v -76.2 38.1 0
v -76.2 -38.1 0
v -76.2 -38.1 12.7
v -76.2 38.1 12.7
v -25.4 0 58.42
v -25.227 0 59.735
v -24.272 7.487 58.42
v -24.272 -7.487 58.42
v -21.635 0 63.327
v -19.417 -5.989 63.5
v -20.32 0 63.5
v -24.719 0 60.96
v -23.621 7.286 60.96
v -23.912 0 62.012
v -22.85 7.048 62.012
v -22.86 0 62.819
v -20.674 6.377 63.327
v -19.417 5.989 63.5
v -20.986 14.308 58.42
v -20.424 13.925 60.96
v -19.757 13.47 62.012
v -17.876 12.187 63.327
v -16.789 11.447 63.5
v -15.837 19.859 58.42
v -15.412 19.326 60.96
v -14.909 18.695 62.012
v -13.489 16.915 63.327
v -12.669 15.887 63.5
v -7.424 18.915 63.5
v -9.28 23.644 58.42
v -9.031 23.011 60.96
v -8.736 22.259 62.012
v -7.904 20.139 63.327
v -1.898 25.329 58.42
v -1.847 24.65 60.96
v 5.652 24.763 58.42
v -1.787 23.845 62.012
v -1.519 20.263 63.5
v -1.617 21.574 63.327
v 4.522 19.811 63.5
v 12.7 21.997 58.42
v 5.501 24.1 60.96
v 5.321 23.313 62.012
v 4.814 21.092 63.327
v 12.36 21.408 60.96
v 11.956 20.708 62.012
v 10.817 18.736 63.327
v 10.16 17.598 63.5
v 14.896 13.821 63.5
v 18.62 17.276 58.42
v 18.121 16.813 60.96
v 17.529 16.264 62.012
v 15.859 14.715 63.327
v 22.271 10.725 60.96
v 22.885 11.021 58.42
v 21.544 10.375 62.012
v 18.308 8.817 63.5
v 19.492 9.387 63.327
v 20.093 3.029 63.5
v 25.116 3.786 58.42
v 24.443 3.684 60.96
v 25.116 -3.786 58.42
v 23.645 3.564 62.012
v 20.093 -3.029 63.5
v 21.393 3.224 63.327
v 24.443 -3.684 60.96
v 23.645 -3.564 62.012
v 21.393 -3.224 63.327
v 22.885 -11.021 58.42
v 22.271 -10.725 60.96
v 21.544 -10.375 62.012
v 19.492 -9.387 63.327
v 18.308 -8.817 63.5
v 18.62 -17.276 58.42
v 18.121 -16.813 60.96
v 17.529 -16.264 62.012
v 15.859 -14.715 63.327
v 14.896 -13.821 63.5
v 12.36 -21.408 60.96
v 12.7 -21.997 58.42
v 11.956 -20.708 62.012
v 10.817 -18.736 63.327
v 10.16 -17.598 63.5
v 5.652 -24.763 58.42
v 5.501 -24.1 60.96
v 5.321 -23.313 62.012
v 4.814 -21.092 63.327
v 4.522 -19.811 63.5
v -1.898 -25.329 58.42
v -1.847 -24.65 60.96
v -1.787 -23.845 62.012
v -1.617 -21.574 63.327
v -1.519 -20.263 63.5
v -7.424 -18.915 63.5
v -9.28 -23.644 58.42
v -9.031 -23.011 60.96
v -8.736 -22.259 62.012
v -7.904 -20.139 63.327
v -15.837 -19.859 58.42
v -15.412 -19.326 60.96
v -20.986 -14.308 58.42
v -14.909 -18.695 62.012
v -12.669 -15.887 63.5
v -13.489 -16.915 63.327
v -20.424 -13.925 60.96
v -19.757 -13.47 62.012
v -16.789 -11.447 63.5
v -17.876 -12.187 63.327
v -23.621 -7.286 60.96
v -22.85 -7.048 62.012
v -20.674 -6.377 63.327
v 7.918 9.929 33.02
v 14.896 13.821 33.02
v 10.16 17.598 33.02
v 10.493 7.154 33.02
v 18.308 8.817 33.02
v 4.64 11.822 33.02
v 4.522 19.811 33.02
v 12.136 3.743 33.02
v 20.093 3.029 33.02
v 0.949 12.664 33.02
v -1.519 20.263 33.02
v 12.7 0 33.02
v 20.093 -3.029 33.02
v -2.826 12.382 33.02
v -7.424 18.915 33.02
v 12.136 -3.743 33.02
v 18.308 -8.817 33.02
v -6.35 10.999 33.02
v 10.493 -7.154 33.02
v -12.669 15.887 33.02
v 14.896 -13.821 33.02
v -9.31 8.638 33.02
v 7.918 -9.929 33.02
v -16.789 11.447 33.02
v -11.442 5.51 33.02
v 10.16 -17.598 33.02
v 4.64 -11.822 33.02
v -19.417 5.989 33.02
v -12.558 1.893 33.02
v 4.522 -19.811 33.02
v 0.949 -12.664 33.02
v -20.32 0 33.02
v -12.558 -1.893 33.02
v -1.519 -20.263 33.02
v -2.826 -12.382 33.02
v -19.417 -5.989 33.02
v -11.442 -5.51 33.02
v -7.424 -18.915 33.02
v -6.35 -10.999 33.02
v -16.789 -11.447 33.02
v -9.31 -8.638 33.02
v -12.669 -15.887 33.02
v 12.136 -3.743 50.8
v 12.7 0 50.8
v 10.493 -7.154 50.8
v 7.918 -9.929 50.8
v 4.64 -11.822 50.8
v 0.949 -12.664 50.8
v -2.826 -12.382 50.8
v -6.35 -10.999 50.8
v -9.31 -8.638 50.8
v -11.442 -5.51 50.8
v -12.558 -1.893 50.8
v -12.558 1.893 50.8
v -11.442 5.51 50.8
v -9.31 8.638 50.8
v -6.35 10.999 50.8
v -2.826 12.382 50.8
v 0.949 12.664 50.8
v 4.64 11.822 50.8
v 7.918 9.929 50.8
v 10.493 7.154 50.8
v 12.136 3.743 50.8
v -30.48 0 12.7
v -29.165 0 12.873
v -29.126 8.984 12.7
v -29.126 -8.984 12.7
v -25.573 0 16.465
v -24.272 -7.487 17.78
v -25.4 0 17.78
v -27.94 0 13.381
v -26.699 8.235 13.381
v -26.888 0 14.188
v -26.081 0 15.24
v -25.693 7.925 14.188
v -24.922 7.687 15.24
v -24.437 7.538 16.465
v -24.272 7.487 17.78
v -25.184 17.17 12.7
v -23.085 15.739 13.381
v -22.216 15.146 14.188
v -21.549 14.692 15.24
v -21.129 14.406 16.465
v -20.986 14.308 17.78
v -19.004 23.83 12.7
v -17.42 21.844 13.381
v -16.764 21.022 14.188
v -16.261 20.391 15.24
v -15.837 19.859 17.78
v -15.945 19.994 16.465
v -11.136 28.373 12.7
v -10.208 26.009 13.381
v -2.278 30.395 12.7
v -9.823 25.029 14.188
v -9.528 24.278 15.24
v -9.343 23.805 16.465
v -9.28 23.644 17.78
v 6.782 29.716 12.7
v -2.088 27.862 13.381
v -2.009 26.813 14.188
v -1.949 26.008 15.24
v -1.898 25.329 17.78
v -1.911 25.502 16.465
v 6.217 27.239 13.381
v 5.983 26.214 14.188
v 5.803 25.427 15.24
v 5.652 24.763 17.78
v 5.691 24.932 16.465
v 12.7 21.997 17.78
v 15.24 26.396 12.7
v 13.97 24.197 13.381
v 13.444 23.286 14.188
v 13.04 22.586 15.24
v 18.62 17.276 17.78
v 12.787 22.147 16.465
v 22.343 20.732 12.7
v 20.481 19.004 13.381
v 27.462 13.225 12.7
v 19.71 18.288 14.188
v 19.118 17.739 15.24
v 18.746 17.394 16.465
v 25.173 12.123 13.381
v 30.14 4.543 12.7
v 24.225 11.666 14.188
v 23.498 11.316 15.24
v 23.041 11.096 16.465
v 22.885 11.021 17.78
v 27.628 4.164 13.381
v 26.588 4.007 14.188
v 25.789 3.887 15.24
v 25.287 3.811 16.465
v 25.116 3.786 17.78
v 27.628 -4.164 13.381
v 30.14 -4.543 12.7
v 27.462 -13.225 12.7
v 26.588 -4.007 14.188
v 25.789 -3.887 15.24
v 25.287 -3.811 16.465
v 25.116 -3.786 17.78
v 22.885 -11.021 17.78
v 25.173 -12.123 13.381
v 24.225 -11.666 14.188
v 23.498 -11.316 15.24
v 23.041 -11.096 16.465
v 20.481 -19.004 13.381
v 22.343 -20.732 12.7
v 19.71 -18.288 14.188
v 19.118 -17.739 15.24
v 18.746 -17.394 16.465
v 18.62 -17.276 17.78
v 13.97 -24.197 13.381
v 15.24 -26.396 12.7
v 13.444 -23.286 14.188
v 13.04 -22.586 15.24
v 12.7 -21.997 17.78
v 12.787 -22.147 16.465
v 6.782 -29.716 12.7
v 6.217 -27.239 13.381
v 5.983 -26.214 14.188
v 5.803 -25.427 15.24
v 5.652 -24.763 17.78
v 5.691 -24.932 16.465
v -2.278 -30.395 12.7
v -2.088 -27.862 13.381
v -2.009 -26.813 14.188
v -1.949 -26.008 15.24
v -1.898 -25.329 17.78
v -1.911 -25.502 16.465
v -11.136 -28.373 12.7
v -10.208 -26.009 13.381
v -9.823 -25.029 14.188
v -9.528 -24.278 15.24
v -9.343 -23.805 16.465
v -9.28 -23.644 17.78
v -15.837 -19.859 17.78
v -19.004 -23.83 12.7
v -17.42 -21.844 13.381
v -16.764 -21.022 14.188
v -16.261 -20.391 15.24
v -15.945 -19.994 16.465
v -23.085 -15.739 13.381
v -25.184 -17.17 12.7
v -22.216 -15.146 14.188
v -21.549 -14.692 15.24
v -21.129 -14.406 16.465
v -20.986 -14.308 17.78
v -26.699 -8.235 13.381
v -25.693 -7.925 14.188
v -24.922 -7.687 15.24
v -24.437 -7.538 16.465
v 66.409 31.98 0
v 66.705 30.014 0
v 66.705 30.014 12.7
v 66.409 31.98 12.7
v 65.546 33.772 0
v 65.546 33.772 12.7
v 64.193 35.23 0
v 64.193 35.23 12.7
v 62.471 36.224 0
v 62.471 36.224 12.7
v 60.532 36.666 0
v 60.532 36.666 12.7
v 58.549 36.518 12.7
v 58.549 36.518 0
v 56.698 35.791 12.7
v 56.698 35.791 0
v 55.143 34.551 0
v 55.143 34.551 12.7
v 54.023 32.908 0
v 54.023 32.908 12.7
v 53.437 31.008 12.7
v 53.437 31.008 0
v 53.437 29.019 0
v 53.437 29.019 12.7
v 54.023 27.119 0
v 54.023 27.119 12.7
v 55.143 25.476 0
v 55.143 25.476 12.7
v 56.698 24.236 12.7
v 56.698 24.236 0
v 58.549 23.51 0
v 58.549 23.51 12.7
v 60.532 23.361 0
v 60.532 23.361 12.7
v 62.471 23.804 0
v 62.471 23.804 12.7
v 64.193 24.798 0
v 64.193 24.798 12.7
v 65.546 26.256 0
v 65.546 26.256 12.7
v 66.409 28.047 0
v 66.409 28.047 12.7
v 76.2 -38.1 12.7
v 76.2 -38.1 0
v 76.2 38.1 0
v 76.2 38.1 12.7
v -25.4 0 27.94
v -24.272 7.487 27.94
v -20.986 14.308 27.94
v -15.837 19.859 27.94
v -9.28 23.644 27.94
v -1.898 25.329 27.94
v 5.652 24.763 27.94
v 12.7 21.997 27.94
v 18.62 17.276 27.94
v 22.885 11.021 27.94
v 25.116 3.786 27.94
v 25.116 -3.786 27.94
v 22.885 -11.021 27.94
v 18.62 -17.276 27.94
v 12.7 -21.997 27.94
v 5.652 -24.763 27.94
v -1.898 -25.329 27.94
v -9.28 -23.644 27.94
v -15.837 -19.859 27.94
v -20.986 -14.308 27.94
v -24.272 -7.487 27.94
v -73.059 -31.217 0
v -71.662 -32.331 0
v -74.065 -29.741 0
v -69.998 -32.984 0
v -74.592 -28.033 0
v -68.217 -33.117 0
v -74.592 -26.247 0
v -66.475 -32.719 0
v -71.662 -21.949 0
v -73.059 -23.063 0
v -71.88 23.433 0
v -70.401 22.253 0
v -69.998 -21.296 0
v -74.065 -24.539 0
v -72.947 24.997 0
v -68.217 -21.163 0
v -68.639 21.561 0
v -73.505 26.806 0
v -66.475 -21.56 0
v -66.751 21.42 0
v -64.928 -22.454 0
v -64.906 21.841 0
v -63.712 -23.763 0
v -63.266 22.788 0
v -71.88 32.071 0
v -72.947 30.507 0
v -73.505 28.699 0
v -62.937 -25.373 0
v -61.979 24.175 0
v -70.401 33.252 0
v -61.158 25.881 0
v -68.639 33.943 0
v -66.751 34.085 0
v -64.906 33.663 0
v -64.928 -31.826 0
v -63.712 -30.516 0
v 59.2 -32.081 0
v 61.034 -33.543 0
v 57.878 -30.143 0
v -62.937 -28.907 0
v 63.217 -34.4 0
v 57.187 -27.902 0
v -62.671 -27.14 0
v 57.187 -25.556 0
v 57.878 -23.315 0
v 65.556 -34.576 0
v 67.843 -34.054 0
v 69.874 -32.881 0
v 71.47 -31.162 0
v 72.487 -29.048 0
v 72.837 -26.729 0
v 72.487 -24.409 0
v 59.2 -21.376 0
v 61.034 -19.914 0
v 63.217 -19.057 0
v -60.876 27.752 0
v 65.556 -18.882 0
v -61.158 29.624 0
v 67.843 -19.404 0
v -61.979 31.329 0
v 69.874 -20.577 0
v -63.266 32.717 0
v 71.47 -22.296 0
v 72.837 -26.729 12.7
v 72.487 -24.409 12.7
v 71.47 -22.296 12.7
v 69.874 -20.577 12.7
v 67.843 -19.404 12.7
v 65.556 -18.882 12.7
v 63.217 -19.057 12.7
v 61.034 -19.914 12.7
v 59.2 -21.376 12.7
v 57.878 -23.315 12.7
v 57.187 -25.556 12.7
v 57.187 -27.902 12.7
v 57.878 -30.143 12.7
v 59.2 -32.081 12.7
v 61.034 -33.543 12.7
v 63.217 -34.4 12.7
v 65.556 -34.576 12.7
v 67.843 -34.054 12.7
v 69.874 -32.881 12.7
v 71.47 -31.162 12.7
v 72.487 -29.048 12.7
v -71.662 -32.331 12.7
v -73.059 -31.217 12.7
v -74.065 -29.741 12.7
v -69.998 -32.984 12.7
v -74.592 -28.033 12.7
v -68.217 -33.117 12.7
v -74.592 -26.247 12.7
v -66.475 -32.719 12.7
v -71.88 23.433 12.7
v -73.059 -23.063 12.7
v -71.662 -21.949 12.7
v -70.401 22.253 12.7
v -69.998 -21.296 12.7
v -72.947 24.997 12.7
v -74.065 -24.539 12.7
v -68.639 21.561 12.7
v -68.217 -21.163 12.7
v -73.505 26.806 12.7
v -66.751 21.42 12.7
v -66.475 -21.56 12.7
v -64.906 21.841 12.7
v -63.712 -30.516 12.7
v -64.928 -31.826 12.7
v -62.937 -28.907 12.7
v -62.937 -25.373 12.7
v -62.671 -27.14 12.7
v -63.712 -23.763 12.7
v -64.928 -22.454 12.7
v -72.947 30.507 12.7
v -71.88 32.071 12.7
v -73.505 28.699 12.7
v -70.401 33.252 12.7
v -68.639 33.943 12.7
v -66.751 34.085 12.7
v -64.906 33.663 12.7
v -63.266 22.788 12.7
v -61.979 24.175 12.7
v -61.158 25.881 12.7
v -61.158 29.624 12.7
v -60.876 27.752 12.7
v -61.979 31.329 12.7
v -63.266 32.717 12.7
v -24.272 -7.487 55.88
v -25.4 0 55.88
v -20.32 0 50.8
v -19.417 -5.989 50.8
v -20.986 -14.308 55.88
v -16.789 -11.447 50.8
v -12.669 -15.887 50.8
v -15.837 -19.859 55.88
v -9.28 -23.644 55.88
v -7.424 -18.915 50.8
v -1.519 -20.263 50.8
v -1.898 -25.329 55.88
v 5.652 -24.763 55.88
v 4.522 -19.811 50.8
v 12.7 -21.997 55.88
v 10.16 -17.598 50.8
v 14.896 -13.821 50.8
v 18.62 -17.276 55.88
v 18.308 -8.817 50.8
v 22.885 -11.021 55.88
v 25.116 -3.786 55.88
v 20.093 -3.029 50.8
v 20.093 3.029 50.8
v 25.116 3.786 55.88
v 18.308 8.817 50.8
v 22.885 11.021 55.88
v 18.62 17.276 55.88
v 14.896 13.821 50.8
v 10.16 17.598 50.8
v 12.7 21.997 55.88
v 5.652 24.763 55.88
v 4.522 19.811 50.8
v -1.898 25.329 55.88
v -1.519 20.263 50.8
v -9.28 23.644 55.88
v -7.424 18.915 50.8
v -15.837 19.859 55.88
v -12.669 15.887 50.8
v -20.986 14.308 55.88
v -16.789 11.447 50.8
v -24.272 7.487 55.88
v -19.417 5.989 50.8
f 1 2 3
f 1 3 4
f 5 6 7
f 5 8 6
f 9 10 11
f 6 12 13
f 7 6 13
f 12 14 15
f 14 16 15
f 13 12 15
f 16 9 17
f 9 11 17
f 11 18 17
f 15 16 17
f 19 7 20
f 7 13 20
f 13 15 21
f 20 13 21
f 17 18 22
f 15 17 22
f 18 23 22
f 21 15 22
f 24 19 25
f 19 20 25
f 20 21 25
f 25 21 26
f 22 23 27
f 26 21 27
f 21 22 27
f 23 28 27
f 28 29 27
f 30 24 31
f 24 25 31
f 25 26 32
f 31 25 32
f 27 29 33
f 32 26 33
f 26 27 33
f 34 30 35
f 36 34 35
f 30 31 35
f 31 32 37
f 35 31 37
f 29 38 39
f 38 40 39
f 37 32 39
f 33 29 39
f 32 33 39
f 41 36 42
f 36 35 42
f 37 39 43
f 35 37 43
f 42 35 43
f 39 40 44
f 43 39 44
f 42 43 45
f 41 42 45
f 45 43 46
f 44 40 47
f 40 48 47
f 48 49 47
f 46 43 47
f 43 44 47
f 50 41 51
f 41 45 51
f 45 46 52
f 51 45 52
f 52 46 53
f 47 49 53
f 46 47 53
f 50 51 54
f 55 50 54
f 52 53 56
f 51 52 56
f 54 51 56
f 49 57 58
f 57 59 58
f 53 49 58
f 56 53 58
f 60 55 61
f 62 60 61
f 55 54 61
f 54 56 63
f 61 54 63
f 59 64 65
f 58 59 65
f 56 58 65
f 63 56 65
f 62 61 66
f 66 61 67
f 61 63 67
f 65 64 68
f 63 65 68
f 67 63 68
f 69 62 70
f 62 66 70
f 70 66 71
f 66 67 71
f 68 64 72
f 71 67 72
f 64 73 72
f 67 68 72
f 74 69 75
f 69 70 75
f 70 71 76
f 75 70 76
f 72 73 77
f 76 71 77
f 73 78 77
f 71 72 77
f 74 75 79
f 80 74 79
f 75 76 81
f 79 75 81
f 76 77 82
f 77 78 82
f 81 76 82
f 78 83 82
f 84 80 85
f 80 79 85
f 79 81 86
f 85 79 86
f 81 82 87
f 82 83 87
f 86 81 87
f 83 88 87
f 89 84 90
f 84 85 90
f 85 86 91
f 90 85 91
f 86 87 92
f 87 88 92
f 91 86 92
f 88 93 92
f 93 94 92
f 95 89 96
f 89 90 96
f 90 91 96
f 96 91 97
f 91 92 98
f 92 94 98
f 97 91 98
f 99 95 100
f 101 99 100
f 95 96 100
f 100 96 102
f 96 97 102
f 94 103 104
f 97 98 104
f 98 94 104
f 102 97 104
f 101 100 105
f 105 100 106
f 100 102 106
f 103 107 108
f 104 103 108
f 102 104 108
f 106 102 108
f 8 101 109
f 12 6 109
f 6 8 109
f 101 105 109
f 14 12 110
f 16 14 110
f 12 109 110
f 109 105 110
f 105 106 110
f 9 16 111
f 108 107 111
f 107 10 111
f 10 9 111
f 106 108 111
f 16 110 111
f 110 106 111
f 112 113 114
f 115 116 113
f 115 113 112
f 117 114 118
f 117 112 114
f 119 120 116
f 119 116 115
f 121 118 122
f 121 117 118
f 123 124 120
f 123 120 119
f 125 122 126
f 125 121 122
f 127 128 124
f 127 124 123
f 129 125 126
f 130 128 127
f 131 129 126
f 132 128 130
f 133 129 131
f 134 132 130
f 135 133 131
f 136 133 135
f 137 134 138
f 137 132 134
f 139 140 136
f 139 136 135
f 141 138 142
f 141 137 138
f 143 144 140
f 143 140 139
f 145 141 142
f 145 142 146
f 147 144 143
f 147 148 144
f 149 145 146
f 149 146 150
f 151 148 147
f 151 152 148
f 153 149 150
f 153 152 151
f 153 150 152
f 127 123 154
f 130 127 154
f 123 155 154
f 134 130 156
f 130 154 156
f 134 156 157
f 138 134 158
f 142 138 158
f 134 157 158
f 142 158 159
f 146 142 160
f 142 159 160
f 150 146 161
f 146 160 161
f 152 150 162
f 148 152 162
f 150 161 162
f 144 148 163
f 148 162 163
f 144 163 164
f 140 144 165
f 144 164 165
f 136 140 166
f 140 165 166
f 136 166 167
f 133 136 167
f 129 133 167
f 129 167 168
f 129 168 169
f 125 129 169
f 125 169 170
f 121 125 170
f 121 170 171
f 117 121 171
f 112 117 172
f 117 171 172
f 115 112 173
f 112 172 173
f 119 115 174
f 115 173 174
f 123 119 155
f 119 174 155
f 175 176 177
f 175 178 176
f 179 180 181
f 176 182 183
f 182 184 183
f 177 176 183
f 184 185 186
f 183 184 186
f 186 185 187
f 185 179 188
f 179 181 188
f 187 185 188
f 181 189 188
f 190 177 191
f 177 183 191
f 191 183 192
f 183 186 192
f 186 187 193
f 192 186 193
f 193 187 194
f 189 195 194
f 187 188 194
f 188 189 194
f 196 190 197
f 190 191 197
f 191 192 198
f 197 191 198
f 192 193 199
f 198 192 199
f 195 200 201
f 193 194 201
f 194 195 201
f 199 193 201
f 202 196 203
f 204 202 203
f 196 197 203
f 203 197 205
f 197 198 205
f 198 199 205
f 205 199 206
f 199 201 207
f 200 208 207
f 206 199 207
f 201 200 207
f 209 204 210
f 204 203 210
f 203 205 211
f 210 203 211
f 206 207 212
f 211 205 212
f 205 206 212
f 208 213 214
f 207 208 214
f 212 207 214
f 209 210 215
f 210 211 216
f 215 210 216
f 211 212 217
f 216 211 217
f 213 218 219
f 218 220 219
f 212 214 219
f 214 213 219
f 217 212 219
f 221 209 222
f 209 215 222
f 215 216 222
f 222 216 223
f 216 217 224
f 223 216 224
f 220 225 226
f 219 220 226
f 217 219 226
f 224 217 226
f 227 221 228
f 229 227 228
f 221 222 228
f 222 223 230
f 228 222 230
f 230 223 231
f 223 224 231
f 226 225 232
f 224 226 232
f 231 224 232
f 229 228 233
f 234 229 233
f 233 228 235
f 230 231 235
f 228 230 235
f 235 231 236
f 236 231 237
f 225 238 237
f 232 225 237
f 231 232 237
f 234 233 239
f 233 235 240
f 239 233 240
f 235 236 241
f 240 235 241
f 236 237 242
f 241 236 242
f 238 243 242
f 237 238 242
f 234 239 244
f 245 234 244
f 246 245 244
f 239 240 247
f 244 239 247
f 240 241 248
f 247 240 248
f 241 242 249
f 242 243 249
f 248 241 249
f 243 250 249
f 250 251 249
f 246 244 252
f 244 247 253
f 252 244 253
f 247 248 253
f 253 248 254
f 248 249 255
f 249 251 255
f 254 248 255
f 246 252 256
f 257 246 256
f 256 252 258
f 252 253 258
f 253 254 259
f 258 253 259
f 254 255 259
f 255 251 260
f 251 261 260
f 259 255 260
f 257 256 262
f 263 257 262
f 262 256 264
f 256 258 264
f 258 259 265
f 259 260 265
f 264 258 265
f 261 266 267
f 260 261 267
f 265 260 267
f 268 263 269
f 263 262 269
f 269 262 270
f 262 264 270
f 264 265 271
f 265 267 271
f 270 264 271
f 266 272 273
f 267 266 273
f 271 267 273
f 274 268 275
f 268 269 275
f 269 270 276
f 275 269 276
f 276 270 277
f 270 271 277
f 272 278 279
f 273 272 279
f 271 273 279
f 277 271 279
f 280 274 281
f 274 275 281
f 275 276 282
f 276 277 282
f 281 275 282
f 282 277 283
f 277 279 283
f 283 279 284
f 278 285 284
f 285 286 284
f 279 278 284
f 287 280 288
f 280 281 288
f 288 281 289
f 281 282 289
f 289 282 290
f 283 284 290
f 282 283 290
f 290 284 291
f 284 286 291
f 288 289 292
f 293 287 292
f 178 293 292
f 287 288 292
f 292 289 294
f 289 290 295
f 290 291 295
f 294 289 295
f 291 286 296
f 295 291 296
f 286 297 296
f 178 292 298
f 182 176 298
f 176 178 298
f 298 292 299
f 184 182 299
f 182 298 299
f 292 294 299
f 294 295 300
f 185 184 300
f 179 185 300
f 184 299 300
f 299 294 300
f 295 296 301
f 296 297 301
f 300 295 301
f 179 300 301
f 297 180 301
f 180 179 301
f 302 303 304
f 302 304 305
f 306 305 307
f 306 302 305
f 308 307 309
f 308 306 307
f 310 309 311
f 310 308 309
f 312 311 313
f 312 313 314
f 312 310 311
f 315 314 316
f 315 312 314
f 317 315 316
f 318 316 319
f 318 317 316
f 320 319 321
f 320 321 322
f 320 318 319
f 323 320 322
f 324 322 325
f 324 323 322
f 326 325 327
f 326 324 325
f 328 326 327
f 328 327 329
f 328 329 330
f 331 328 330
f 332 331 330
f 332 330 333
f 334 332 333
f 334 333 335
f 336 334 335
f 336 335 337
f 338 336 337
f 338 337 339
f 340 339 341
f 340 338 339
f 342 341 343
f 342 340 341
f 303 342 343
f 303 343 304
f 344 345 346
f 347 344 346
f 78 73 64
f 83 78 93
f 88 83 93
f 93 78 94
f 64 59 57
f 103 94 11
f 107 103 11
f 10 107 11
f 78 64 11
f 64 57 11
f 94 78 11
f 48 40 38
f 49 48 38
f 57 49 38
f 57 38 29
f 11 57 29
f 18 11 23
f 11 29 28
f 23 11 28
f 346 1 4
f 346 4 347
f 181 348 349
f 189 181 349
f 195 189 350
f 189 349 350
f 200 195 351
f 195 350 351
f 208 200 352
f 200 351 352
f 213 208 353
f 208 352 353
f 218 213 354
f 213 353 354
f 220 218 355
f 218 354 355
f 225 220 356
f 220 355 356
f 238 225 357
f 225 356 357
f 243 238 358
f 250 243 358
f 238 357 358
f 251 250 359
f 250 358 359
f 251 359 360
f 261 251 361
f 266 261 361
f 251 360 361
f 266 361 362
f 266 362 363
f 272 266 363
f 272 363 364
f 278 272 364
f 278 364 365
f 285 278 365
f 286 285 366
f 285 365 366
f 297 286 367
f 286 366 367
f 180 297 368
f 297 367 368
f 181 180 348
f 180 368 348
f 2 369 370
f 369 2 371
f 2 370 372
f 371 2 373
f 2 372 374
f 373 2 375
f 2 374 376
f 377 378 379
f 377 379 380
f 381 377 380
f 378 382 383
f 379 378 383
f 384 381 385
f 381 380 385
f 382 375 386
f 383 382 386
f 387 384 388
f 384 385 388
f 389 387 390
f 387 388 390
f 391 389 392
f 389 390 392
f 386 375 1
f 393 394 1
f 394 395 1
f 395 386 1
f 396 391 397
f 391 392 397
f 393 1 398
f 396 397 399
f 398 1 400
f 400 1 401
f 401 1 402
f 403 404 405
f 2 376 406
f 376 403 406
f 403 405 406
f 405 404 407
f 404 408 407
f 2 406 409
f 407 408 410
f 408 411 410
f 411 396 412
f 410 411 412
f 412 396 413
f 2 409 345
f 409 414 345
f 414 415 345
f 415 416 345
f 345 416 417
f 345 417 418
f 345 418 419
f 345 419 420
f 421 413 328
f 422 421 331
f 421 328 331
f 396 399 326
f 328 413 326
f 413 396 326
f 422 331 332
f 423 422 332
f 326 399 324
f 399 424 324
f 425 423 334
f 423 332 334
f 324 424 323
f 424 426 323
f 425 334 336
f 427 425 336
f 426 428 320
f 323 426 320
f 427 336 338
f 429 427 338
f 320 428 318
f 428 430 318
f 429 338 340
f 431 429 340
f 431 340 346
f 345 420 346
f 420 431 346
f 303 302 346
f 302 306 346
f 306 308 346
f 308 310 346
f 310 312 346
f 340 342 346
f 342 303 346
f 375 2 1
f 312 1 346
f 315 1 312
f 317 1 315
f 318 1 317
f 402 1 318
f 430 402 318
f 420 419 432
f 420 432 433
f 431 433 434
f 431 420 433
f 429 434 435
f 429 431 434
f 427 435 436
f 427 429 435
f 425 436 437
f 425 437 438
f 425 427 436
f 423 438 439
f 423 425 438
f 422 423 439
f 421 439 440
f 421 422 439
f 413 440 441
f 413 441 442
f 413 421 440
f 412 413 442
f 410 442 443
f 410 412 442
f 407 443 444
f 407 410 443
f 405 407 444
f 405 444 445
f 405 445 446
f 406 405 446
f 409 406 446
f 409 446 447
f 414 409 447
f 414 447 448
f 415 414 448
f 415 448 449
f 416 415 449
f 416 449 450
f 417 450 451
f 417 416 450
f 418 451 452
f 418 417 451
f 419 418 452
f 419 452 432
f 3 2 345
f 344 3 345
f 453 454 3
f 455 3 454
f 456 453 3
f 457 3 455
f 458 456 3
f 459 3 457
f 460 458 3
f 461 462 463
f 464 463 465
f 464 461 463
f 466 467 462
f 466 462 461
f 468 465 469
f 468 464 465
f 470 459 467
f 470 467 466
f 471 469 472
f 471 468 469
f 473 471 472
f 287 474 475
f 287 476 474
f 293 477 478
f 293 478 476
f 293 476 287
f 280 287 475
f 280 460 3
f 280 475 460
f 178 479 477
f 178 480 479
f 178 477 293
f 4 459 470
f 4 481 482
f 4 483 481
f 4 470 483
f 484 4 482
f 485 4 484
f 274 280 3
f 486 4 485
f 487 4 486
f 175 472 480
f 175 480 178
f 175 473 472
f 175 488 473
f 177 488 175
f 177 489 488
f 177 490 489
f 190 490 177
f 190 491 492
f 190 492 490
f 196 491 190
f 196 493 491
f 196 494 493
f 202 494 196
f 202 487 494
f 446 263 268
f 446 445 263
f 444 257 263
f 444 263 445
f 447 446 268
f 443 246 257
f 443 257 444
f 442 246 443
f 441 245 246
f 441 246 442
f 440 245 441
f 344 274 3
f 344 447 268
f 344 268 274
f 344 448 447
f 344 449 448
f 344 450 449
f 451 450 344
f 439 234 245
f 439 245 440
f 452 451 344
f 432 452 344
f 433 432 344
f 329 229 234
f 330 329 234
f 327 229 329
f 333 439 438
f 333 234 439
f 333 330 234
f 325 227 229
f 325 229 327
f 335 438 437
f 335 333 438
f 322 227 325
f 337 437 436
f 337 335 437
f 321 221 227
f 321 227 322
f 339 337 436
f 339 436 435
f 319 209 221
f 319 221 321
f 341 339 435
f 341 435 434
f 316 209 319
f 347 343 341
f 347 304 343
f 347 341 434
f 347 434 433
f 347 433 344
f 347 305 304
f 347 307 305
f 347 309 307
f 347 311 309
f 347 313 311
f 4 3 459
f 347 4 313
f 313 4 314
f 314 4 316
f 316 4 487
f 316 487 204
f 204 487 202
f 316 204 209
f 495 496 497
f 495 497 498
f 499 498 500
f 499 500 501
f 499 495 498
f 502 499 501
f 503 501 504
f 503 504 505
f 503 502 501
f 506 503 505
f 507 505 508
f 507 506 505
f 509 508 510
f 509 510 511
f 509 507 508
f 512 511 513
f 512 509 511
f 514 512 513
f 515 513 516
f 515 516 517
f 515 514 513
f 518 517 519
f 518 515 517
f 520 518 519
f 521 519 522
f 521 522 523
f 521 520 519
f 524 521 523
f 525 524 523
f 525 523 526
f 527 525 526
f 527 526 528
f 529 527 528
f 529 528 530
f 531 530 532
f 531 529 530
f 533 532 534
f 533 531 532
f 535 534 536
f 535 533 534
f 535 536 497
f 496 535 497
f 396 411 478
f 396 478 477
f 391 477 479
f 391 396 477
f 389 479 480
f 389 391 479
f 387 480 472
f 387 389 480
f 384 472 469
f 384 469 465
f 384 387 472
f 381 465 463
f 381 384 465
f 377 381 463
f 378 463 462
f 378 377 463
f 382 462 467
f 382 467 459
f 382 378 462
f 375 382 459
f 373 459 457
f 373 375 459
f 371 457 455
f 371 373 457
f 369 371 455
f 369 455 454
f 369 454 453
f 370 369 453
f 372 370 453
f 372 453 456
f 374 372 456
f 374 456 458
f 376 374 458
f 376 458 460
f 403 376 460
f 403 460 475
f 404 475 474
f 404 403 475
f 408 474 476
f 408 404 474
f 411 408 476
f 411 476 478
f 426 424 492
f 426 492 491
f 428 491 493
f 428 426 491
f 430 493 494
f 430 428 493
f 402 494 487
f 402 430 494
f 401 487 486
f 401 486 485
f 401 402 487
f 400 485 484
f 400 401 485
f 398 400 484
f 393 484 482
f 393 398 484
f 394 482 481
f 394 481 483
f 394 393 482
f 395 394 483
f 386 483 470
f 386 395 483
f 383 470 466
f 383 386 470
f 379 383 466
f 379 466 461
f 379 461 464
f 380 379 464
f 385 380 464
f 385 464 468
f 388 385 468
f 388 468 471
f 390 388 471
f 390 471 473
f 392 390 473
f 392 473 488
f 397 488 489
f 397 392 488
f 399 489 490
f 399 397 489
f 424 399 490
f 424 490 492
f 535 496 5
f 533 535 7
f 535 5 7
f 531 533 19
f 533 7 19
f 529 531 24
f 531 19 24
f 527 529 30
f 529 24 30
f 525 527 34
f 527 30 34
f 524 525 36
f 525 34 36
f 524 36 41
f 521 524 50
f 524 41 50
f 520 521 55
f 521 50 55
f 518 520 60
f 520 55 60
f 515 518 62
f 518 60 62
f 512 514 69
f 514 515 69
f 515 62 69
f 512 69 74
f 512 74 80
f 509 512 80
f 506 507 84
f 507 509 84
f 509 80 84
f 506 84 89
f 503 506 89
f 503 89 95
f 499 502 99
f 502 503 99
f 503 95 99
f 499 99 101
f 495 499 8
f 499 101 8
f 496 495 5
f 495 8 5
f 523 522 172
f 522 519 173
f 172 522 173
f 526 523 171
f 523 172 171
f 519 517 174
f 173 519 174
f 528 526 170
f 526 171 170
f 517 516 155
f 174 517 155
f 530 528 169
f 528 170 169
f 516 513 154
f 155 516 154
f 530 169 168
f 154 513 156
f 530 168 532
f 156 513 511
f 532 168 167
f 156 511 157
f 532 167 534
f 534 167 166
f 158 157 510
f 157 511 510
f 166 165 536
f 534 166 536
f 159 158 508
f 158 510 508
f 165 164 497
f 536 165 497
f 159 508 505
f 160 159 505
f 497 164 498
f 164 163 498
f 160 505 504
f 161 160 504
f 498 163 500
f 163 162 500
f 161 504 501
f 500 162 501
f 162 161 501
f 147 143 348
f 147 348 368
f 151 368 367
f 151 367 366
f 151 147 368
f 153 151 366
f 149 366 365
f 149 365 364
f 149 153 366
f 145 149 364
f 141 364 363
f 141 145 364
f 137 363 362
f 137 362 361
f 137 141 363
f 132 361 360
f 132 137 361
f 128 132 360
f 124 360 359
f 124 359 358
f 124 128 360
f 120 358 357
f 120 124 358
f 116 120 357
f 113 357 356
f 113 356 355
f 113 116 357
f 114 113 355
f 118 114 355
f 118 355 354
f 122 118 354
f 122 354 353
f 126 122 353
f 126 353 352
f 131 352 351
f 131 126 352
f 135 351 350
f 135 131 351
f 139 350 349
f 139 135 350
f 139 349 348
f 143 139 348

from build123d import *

# Parameters (mm, degrees)
F0_W     = 152.4
F0_H     = 76.2
F1_DEPTH = 12.7
F2_R     = 6.35
F2_R_2   = 5.9938939969
F2_R_3   = 6.6713502792
F2_R_4   = 7.8689754044
F3_DEPTH = 12.7
F4_W     = 25.4
F4_H     = 50.8
F6_W     = 17.78
F6_H     = 17.78
F8_R     = 5.08
F9_SIZE  = 5.08


with BuildPart() as f1:
    # F0 (on Top) → F1 (new body)
    with BuildSketch(Plane.XY):
        Rectangle(F0_W, F0_H)
    extrude(amount=F1_DEPTH)

    # F2 (on Top) → F3 (cut)
    with BuildSketch(Plane.XY):
        with Locations((-67.2256079361, 27.7522747686)):
            Circle(F2_R)
        with Locations((-68.6647296343, -27.1399345782)):
            Circle(F2_R_2)
        with Locations((60.0338615502, 30.0137525229)):
            Circle(F2_R_3)
        with Locations((64.9679941536, -26.7287574834)):
            Circle(F2_R_4)
    extrude(amount=F3_DEPTH, mode=Mode.SUBTRACT)

    # F4 (on Front) → F5 (revolve)
    with BuildSketch(Plane.XZ):
        with Locations((-12.7, 38.1)):
            Rectangle(F4_W, F4_H)
    revolve(axis=Axis((0, 0, 38.1), (0, 0, -1)))

    # F6 (on Front) → F7 (revolve, cut)
    with BuildSketch(Plane.XZ):
        with Locations((21.59, 41.91)):
            Rectangle(F6_W, F6_H)
    revolve(axis=Axis((0, 0, 63.5), (0, 0, -1)), mode=Mode.SUBTRACT)

    # F8
    f8_edges = [f1.edges().sort_by_distance(p)[0] for p in [
        (25.4, 0, 63.5),
        (25.4, 0, 12.7),
    ]]
    fillet(f8_edges, radius=F8_R)

    # F9
    f9_edges = [f1.edges().sort_by_distance(p)[0] for p in [
        (25.4, 0, 33.02),
        (25.4, 0, 50.8),
    ]]
    chamfer(f9_edges, length=F9_SIZE)


solid = f1.part
